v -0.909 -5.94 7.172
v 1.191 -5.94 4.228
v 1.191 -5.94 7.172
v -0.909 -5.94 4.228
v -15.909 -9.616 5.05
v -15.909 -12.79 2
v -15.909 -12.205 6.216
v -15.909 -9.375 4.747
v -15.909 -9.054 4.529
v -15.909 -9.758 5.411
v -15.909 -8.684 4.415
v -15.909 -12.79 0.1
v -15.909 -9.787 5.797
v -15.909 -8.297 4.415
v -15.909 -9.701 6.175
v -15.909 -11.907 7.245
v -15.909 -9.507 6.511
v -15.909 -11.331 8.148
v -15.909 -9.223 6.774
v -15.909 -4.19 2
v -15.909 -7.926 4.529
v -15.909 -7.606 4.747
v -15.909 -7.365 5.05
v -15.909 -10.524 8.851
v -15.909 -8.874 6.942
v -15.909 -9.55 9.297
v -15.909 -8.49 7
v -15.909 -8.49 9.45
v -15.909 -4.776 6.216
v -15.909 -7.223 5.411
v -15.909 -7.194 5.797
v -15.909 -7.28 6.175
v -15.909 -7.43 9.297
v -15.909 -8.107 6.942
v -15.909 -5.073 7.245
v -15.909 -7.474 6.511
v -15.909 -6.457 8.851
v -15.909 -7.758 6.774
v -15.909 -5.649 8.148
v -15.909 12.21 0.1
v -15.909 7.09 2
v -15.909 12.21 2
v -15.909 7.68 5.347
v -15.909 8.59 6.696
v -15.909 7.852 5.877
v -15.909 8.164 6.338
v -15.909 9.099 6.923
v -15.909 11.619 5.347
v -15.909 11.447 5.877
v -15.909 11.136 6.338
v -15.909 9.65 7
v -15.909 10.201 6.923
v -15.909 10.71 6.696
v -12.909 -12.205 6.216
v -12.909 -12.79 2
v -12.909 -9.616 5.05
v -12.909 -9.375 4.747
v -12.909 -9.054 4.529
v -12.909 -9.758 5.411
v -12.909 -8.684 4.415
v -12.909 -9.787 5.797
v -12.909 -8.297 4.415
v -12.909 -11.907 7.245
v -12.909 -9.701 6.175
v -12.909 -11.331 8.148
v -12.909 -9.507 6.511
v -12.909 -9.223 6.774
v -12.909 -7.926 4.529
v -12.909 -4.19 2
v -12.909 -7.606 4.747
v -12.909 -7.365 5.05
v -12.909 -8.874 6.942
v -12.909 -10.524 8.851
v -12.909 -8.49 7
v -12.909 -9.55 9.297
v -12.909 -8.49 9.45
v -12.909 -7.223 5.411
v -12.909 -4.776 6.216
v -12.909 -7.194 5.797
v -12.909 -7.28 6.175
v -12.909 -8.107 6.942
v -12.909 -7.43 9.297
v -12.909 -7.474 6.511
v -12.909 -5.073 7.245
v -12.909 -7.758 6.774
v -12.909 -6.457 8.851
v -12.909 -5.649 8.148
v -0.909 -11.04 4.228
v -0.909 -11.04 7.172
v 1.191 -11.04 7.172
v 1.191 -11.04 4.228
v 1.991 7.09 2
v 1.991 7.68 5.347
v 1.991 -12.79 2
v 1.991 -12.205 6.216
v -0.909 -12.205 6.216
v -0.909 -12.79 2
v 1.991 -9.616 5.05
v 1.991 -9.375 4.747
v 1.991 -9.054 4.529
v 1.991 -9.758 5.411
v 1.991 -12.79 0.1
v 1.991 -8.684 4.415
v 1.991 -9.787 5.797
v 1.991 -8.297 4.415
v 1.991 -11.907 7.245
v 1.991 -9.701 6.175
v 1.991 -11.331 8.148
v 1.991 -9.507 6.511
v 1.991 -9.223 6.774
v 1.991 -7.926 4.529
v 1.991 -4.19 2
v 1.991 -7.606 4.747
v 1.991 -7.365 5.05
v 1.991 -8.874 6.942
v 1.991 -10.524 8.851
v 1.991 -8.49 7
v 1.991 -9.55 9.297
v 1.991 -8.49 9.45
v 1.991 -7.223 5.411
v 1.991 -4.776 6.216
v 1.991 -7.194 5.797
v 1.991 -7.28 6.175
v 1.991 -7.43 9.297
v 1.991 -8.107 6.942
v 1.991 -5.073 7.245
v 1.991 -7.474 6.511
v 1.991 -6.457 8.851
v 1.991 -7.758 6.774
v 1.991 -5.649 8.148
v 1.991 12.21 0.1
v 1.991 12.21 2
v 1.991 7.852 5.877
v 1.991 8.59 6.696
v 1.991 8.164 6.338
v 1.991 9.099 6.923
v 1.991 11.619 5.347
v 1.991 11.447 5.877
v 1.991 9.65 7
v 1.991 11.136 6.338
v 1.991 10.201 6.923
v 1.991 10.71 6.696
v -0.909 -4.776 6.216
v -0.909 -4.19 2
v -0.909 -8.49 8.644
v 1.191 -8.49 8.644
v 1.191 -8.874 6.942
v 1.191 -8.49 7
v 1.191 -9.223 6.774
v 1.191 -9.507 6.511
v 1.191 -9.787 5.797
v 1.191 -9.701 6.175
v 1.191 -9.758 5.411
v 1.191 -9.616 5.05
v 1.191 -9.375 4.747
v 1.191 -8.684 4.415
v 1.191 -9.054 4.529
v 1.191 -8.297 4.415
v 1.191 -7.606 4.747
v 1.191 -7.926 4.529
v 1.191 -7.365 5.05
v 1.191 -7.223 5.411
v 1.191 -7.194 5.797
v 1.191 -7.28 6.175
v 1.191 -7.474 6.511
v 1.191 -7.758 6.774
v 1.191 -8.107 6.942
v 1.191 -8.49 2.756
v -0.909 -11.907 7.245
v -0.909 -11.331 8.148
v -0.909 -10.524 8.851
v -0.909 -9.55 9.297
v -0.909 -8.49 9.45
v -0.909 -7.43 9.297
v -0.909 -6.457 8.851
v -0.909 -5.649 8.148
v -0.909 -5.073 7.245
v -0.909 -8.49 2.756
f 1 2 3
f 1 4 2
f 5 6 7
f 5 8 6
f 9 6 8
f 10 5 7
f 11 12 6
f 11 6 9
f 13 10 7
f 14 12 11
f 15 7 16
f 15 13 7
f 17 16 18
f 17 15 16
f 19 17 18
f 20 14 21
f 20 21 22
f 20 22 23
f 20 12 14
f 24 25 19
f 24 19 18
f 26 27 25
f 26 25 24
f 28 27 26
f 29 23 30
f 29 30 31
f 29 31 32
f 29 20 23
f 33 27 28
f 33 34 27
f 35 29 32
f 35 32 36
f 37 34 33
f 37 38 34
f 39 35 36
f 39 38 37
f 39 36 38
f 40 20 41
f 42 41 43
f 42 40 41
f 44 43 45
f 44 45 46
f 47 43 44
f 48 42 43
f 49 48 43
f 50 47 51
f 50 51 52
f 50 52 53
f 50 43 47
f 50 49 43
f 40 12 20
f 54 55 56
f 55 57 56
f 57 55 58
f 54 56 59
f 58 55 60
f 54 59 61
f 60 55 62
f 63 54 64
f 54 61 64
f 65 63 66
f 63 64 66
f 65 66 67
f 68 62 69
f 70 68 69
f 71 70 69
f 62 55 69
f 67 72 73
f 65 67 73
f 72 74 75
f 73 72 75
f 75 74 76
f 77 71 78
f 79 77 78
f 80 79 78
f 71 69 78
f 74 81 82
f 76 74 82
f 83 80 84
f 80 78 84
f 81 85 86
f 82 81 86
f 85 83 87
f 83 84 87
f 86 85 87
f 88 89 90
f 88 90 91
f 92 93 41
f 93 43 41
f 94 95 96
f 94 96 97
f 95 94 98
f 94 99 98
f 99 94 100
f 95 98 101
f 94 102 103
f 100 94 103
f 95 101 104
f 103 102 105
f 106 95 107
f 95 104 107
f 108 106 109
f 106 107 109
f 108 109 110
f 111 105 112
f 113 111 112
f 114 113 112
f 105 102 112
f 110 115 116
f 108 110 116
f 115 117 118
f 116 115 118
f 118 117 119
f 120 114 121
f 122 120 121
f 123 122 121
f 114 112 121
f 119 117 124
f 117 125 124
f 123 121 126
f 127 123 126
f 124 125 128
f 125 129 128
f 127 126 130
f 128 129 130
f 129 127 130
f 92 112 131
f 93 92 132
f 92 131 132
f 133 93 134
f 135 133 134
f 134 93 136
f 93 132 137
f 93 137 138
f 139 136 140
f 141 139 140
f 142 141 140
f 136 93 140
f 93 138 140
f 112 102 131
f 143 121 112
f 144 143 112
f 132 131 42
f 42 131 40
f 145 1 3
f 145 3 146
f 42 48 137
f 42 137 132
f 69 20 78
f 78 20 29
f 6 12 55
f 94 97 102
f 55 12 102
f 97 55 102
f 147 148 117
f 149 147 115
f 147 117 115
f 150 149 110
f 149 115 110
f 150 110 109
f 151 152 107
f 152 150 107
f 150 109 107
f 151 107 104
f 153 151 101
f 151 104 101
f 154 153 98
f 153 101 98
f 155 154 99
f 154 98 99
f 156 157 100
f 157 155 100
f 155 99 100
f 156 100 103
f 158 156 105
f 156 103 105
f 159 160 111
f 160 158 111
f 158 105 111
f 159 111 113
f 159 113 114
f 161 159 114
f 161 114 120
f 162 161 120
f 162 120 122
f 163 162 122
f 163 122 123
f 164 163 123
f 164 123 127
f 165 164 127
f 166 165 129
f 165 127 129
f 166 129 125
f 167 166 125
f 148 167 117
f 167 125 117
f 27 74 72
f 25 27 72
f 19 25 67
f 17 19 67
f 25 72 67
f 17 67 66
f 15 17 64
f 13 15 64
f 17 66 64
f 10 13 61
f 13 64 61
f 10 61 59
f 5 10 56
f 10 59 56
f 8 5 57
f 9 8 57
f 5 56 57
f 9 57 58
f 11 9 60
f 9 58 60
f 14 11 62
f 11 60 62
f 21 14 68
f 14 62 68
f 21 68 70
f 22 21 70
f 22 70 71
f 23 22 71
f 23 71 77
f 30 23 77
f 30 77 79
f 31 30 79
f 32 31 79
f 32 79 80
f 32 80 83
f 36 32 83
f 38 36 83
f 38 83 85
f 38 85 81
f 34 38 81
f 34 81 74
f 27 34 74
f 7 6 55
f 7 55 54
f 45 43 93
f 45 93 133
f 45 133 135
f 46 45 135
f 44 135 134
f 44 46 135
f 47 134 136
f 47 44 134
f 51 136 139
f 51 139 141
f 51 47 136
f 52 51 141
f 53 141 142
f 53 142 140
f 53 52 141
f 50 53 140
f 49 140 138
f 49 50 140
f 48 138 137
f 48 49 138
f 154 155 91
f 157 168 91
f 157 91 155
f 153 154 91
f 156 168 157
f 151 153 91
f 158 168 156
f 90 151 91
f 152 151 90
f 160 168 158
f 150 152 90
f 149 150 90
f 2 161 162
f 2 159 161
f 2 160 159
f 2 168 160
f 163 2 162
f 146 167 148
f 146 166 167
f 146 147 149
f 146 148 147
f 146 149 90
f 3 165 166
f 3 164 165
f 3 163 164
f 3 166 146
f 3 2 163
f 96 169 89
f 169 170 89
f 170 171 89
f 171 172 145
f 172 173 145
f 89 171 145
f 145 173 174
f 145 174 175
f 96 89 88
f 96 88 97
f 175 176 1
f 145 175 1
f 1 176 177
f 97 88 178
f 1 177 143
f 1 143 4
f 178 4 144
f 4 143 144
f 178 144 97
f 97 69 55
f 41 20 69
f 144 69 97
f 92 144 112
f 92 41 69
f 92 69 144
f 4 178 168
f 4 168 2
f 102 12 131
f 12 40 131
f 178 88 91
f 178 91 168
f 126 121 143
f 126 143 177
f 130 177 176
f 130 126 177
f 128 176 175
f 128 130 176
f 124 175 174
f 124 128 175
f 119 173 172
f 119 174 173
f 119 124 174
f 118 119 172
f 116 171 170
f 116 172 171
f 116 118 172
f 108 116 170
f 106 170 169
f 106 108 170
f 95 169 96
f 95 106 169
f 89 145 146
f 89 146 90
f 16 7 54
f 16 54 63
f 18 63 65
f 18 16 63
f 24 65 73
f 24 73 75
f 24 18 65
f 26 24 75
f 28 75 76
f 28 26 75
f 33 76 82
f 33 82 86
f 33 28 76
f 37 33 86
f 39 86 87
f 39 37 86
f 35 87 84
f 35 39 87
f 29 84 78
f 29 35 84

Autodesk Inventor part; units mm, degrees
ref_plane "YZ Plane" through (0, 0, 0) normal (1, 0, 0) x (0, 1, 0)
ref_plane "XZ Plane" through (0, 0, 0) normal (0, 1, 0) x (-1, 0, 0)
ref_plane "XY Plane" through (0, 0, 0) normal (0, 0, 1) x (1, 0, 0)
sketch "Sketch1" plane through (0, 0, 0) normal (0, 0, 1) x (1, 0, 0)
  line L0 (2.0907, -12.7904) -> (2.0907, 12.2096)
  line L1 (2.0907, 12.2096) -> (-15.9093, 12.2096)
  line L2 (-15.9093, 12.2096) -> (-15.9093, -12.7904)
  line L3 (-15.9093, -12.7904) -> (2.0907, -12.7904) projected
  line L4 (-15.9093, 17.2096) -> (-15.9093, -14.7904) construction
  line L5 (2.0907, -14.7904) -> (2.0907, 17.2096) construction
  dimension "d27" = 25
extrude "Extrusion1" add sketch "Sketch1" along normal blind 2
sketch "Sketch2" plane through (-15.9093, -7.7904, 0) normal (-1, 0, 0) x (0, 0, 1)
  circle A0 centre (5.7, -0.7) radius 1.25 construction
  line L0 (2, -5) -> (6.216, -4.4143)
  arc A1 (6.216, -4.4143) -> (6.216, 3.0143) centre (5.7, -0.7) ccw
  line L1 (5.7, -0.7) -> (2, -0.7) construction
  line L2 (2, 3.6) -> (6.216, 3.0143)
  line L3 (2, 3.6) -> (2, -5)
  line L4 (0, -5) -> (2, -5) construction
  arc A2 (4.4, -0.7) -> (7, -0.7) centre (5.7, -0.7) ccw construction
  dimension "d2" = 2.5
  dimension "d3" = 3.75
extrude "Extrusion2" add sketch "Sketch2" against normal blind 3
ref_plane "Work Plane1" through (-6.9093, -12.7904, 0) normal (-1, 0, 0) x (0, 0, 1)
mirror "Mirror1" about plane through (-6.9093, -12.7904, 0) normal (-1, 0, 0) of "Extrusion2"
hole "Hole1" at (-15.9093, -8.4904, 5.7) direction (1, 0, 0) diameter 2.6 end through all clearance for "Socket Head Cap Screw ISO 4762" size "M2.5" standard "ISO"
sketch "Sketch3" plane through (-0.9093, -8.4904, 5.7) normal (-1, 0, 0) x (0, 0, 1)
  circle A0 centre (0, 0) radius 1.3 projected
  line L0 (-1.4722, -2.55) -> (-2.9445, 0)
  line L1 (-2.9445, 0) -> (-1.4722, 2.55)
  line L2 (-1.4722, 2.55) -> (1.4722, 2.55)
  line L3 (1.4722, 2.55) -> (2.9445, 0)
  line L4 (2.9445, 0) -> (1.4722, -2.55)
  line L5 (1.4722, -2.55) -> (-1.4722, -2.55)
  point P0 (-5.7, 8.4904)
  point P1 (0, 0)
  dimension "d18" = 5.1
extrude "Extrusion3" cut sketch "Sketch3" against normal blind 2.1
sketch "Sketch4" plane through (-15.9093, -12.7904, 0) normal (-1, 0, 0) x (0, 0, 1)
  arc A0 (5.3473, 20.4706) -> (5.3473, 24.4098) centre (5, 22.4402) ccw
  line L0 (5, 22.4402) -> (2, 22.4402) construction
  line L1 (2, 25) -> (2, 8.6) construction
  line L2 (5.3473, 24.4098) -> (2, 25)
  line L3 (5.3473, 20.4706) -> (2, 19.8803)
  line L4 (2, 25) -> (2, 19.8803)
  point P0 (0, 12.7904)
  dimension "d21" = 2
  dimension "d22" = 3
  dimension "d24" = 80
extrude "Extrusion4" add sketch "Sketch4" against normal up to surface (18 mm away)
thicken "Thicken1" operation add thickness 0.1 both sides no extend neighbours yes toward (-1, 0, 0) faces at (2.0907, -1.5904, 0.6667)
thicken "Thicken2" operation add thickness 0.1 both sides no extend neighbours yes toward (0, 0, 1) faces at (-3.976, -4.4571, 0)
properties part number "Encoder_Mount1_Slider"
